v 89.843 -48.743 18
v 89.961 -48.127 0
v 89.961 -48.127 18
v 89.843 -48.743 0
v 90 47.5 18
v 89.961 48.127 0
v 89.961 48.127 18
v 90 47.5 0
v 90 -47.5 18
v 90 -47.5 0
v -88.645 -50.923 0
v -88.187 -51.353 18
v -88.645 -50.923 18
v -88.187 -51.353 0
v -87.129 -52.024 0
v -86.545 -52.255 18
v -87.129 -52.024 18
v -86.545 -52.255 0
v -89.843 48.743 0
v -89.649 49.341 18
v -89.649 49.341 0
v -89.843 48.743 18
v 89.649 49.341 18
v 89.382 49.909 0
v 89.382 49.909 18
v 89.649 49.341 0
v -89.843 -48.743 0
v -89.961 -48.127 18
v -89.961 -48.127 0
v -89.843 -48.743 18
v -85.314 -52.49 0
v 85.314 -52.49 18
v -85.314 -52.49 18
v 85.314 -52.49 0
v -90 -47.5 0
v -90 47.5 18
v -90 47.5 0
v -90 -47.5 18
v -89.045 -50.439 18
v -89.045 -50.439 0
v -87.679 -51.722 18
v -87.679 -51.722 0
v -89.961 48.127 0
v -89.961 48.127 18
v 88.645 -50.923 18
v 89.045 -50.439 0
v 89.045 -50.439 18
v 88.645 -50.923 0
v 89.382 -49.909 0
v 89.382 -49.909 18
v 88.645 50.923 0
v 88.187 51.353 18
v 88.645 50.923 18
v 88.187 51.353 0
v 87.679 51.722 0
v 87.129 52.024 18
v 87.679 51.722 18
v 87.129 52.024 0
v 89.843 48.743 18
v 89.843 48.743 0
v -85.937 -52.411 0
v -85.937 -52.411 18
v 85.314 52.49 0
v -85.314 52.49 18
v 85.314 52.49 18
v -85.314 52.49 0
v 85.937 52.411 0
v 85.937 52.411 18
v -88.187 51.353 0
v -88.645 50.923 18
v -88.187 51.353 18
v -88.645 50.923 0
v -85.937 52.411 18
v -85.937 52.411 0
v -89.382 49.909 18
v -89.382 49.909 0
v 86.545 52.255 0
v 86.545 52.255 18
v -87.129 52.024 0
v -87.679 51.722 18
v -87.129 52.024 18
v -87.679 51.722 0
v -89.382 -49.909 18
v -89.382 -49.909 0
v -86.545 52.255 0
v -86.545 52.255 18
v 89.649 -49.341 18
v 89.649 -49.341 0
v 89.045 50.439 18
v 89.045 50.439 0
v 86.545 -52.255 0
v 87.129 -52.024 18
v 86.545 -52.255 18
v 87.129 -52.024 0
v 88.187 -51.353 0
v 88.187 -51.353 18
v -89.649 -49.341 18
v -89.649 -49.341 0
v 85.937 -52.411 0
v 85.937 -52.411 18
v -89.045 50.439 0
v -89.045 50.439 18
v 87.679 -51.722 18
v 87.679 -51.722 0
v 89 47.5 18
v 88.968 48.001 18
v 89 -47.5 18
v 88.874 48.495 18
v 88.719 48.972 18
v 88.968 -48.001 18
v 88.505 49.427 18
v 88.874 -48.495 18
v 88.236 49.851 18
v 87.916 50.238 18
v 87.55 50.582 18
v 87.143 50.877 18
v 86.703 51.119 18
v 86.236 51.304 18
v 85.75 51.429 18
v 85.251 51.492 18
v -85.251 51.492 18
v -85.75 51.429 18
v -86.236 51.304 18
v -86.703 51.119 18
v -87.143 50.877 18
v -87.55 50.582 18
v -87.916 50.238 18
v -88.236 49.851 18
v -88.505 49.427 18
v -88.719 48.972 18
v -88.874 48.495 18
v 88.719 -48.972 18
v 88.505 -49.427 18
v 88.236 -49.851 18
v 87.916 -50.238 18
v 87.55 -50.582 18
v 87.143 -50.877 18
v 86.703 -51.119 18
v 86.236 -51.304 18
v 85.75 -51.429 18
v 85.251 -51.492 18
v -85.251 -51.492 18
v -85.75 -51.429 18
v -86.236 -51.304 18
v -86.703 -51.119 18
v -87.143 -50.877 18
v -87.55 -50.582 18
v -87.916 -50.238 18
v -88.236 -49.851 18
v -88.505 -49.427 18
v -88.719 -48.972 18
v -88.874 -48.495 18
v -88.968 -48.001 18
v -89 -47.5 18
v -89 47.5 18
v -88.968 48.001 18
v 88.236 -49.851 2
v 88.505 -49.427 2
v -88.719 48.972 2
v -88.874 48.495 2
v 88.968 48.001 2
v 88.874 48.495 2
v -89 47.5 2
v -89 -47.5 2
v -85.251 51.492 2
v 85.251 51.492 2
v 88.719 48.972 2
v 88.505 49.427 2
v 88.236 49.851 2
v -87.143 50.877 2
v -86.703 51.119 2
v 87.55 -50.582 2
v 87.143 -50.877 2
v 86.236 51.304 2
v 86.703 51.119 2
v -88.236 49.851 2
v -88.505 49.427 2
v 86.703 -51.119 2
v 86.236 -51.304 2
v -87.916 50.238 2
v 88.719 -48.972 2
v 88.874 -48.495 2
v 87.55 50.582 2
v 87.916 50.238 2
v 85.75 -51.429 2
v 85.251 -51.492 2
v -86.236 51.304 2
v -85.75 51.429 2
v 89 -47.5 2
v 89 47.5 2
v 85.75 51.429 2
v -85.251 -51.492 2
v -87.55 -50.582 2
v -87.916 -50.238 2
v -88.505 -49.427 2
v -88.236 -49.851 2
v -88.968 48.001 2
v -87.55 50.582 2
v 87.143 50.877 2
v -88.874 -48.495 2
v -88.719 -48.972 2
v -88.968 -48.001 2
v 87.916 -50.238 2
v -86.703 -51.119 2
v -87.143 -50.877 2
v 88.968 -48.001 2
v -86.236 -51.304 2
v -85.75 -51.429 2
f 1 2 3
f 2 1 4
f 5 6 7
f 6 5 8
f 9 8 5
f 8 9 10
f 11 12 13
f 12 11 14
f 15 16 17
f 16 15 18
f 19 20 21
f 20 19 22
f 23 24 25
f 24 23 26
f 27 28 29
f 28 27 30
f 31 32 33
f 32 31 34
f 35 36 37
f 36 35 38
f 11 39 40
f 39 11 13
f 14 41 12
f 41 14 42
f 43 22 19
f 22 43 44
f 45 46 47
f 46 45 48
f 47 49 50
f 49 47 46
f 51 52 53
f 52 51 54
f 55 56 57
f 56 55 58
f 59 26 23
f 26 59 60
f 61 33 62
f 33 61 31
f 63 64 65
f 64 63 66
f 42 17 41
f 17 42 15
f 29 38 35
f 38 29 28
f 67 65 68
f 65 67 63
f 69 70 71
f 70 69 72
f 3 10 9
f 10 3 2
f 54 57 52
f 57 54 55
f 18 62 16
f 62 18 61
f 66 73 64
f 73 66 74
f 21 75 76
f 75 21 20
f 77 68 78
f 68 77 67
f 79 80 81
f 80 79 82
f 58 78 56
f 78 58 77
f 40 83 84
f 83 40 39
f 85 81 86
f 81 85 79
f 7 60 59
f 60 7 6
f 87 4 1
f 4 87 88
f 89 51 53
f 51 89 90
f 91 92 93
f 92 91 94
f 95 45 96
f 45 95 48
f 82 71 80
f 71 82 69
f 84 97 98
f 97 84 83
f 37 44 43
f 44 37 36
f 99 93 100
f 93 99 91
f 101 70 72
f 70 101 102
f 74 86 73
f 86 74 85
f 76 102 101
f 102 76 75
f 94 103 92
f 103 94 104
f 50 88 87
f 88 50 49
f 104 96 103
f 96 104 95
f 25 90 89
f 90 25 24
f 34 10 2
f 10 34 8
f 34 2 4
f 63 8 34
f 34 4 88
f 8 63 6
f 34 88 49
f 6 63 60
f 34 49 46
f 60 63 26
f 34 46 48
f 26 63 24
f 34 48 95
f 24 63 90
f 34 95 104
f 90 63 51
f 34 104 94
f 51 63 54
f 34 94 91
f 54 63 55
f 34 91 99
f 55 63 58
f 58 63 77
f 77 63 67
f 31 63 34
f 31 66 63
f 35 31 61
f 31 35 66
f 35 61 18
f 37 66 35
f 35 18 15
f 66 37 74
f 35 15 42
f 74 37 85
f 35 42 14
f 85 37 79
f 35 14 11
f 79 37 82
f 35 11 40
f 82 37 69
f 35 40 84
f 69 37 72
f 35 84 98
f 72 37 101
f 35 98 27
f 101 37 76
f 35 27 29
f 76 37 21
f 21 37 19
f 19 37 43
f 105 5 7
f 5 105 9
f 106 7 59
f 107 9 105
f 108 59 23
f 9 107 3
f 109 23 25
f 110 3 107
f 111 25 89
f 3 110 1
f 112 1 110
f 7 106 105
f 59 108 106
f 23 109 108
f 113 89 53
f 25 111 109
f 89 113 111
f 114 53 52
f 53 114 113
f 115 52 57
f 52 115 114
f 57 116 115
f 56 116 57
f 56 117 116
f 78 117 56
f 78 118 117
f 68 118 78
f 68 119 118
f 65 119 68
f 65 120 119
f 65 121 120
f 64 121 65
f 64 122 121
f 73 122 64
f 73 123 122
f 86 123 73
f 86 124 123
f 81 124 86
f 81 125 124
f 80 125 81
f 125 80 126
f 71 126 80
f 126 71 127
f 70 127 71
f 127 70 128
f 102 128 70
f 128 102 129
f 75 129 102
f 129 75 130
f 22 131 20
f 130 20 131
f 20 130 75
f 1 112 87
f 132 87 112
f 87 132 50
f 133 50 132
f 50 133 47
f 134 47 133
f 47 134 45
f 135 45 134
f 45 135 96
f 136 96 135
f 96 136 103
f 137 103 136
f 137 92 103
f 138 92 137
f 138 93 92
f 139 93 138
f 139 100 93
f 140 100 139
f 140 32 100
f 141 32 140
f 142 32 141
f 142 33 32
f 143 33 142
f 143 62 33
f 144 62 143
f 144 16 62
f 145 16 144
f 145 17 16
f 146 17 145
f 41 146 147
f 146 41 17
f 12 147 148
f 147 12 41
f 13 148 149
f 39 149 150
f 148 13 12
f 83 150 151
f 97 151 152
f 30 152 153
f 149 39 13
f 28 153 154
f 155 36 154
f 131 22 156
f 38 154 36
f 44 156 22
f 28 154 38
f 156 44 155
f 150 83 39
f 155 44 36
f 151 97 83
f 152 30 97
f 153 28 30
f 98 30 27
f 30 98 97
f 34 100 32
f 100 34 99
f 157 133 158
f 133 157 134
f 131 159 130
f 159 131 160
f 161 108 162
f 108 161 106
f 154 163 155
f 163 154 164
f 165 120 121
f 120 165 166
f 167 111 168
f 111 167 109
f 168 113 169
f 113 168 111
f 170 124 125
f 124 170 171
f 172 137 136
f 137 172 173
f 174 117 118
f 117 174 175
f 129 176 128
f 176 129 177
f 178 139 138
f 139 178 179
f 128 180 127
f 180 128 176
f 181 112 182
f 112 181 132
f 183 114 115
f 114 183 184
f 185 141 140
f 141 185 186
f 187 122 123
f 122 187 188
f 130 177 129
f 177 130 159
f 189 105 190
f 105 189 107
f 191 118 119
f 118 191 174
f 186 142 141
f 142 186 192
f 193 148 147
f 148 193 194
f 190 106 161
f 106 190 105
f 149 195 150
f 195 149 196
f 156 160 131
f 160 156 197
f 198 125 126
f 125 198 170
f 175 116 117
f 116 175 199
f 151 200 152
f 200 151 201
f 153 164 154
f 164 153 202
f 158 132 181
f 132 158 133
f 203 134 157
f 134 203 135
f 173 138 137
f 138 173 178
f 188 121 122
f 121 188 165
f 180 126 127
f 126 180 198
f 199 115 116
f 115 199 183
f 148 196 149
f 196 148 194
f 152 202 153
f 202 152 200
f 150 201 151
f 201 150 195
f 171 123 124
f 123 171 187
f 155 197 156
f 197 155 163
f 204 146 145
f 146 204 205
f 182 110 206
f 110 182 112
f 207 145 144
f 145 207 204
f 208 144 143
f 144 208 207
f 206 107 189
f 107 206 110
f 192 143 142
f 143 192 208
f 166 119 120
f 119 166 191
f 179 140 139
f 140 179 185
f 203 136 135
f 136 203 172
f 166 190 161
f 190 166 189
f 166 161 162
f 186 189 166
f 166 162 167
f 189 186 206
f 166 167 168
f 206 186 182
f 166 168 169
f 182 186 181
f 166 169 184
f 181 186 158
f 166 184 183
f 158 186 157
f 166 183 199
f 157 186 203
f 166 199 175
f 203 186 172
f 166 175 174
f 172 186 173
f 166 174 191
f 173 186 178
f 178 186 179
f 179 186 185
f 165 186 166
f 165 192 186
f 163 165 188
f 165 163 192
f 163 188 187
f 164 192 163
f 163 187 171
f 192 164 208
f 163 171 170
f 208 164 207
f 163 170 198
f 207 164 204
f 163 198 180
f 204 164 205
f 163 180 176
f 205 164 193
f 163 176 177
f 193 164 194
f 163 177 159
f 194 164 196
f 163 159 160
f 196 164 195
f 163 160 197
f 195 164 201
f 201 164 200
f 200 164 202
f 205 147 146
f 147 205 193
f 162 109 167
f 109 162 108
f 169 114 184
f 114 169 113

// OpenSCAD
$fn = 50;


difference() {
	union() {
		hull() {
			translate(v = [-85.0000000000, 47.5000000000, 0]) {
				cylinder(h = 18, r = 5);
			}
			translate(v = [85.0000000000, 47.5000000000, 0]) {
				cylinder(h = 18, r = 5);
			}
			translate(v = [-85.0000000000, -47.5000000000, 0]) {
				cylinder(h = 18, r = 5);
			}
			translate(v = [85.0000000000, -47.5000000000, 0]) {
				cylinder(h = 18, r = 5);
			}
		}
	}
	union() {
		translate(v = [0, 0, 2]) {
			hull() {
				translate(v = [-85.0000000000, 47.5000000000, 0]) {
					cylinder(h = 16, r = 4);
				}
				translate(v = [85.0000000000, 47.5000000000, 0]) {
					cylinder(h = 16, r = 4);
				}
				translate(v = [-85.0000000000, -47.5000000000, 0]) {
					cylinder(h = 16, r = 4);
				}
				translate(v = [85.0000000000, -47.5000000000, 0]) {
					cylinder(h = 16, r = 4);
				}
			}
		}
	}
}
